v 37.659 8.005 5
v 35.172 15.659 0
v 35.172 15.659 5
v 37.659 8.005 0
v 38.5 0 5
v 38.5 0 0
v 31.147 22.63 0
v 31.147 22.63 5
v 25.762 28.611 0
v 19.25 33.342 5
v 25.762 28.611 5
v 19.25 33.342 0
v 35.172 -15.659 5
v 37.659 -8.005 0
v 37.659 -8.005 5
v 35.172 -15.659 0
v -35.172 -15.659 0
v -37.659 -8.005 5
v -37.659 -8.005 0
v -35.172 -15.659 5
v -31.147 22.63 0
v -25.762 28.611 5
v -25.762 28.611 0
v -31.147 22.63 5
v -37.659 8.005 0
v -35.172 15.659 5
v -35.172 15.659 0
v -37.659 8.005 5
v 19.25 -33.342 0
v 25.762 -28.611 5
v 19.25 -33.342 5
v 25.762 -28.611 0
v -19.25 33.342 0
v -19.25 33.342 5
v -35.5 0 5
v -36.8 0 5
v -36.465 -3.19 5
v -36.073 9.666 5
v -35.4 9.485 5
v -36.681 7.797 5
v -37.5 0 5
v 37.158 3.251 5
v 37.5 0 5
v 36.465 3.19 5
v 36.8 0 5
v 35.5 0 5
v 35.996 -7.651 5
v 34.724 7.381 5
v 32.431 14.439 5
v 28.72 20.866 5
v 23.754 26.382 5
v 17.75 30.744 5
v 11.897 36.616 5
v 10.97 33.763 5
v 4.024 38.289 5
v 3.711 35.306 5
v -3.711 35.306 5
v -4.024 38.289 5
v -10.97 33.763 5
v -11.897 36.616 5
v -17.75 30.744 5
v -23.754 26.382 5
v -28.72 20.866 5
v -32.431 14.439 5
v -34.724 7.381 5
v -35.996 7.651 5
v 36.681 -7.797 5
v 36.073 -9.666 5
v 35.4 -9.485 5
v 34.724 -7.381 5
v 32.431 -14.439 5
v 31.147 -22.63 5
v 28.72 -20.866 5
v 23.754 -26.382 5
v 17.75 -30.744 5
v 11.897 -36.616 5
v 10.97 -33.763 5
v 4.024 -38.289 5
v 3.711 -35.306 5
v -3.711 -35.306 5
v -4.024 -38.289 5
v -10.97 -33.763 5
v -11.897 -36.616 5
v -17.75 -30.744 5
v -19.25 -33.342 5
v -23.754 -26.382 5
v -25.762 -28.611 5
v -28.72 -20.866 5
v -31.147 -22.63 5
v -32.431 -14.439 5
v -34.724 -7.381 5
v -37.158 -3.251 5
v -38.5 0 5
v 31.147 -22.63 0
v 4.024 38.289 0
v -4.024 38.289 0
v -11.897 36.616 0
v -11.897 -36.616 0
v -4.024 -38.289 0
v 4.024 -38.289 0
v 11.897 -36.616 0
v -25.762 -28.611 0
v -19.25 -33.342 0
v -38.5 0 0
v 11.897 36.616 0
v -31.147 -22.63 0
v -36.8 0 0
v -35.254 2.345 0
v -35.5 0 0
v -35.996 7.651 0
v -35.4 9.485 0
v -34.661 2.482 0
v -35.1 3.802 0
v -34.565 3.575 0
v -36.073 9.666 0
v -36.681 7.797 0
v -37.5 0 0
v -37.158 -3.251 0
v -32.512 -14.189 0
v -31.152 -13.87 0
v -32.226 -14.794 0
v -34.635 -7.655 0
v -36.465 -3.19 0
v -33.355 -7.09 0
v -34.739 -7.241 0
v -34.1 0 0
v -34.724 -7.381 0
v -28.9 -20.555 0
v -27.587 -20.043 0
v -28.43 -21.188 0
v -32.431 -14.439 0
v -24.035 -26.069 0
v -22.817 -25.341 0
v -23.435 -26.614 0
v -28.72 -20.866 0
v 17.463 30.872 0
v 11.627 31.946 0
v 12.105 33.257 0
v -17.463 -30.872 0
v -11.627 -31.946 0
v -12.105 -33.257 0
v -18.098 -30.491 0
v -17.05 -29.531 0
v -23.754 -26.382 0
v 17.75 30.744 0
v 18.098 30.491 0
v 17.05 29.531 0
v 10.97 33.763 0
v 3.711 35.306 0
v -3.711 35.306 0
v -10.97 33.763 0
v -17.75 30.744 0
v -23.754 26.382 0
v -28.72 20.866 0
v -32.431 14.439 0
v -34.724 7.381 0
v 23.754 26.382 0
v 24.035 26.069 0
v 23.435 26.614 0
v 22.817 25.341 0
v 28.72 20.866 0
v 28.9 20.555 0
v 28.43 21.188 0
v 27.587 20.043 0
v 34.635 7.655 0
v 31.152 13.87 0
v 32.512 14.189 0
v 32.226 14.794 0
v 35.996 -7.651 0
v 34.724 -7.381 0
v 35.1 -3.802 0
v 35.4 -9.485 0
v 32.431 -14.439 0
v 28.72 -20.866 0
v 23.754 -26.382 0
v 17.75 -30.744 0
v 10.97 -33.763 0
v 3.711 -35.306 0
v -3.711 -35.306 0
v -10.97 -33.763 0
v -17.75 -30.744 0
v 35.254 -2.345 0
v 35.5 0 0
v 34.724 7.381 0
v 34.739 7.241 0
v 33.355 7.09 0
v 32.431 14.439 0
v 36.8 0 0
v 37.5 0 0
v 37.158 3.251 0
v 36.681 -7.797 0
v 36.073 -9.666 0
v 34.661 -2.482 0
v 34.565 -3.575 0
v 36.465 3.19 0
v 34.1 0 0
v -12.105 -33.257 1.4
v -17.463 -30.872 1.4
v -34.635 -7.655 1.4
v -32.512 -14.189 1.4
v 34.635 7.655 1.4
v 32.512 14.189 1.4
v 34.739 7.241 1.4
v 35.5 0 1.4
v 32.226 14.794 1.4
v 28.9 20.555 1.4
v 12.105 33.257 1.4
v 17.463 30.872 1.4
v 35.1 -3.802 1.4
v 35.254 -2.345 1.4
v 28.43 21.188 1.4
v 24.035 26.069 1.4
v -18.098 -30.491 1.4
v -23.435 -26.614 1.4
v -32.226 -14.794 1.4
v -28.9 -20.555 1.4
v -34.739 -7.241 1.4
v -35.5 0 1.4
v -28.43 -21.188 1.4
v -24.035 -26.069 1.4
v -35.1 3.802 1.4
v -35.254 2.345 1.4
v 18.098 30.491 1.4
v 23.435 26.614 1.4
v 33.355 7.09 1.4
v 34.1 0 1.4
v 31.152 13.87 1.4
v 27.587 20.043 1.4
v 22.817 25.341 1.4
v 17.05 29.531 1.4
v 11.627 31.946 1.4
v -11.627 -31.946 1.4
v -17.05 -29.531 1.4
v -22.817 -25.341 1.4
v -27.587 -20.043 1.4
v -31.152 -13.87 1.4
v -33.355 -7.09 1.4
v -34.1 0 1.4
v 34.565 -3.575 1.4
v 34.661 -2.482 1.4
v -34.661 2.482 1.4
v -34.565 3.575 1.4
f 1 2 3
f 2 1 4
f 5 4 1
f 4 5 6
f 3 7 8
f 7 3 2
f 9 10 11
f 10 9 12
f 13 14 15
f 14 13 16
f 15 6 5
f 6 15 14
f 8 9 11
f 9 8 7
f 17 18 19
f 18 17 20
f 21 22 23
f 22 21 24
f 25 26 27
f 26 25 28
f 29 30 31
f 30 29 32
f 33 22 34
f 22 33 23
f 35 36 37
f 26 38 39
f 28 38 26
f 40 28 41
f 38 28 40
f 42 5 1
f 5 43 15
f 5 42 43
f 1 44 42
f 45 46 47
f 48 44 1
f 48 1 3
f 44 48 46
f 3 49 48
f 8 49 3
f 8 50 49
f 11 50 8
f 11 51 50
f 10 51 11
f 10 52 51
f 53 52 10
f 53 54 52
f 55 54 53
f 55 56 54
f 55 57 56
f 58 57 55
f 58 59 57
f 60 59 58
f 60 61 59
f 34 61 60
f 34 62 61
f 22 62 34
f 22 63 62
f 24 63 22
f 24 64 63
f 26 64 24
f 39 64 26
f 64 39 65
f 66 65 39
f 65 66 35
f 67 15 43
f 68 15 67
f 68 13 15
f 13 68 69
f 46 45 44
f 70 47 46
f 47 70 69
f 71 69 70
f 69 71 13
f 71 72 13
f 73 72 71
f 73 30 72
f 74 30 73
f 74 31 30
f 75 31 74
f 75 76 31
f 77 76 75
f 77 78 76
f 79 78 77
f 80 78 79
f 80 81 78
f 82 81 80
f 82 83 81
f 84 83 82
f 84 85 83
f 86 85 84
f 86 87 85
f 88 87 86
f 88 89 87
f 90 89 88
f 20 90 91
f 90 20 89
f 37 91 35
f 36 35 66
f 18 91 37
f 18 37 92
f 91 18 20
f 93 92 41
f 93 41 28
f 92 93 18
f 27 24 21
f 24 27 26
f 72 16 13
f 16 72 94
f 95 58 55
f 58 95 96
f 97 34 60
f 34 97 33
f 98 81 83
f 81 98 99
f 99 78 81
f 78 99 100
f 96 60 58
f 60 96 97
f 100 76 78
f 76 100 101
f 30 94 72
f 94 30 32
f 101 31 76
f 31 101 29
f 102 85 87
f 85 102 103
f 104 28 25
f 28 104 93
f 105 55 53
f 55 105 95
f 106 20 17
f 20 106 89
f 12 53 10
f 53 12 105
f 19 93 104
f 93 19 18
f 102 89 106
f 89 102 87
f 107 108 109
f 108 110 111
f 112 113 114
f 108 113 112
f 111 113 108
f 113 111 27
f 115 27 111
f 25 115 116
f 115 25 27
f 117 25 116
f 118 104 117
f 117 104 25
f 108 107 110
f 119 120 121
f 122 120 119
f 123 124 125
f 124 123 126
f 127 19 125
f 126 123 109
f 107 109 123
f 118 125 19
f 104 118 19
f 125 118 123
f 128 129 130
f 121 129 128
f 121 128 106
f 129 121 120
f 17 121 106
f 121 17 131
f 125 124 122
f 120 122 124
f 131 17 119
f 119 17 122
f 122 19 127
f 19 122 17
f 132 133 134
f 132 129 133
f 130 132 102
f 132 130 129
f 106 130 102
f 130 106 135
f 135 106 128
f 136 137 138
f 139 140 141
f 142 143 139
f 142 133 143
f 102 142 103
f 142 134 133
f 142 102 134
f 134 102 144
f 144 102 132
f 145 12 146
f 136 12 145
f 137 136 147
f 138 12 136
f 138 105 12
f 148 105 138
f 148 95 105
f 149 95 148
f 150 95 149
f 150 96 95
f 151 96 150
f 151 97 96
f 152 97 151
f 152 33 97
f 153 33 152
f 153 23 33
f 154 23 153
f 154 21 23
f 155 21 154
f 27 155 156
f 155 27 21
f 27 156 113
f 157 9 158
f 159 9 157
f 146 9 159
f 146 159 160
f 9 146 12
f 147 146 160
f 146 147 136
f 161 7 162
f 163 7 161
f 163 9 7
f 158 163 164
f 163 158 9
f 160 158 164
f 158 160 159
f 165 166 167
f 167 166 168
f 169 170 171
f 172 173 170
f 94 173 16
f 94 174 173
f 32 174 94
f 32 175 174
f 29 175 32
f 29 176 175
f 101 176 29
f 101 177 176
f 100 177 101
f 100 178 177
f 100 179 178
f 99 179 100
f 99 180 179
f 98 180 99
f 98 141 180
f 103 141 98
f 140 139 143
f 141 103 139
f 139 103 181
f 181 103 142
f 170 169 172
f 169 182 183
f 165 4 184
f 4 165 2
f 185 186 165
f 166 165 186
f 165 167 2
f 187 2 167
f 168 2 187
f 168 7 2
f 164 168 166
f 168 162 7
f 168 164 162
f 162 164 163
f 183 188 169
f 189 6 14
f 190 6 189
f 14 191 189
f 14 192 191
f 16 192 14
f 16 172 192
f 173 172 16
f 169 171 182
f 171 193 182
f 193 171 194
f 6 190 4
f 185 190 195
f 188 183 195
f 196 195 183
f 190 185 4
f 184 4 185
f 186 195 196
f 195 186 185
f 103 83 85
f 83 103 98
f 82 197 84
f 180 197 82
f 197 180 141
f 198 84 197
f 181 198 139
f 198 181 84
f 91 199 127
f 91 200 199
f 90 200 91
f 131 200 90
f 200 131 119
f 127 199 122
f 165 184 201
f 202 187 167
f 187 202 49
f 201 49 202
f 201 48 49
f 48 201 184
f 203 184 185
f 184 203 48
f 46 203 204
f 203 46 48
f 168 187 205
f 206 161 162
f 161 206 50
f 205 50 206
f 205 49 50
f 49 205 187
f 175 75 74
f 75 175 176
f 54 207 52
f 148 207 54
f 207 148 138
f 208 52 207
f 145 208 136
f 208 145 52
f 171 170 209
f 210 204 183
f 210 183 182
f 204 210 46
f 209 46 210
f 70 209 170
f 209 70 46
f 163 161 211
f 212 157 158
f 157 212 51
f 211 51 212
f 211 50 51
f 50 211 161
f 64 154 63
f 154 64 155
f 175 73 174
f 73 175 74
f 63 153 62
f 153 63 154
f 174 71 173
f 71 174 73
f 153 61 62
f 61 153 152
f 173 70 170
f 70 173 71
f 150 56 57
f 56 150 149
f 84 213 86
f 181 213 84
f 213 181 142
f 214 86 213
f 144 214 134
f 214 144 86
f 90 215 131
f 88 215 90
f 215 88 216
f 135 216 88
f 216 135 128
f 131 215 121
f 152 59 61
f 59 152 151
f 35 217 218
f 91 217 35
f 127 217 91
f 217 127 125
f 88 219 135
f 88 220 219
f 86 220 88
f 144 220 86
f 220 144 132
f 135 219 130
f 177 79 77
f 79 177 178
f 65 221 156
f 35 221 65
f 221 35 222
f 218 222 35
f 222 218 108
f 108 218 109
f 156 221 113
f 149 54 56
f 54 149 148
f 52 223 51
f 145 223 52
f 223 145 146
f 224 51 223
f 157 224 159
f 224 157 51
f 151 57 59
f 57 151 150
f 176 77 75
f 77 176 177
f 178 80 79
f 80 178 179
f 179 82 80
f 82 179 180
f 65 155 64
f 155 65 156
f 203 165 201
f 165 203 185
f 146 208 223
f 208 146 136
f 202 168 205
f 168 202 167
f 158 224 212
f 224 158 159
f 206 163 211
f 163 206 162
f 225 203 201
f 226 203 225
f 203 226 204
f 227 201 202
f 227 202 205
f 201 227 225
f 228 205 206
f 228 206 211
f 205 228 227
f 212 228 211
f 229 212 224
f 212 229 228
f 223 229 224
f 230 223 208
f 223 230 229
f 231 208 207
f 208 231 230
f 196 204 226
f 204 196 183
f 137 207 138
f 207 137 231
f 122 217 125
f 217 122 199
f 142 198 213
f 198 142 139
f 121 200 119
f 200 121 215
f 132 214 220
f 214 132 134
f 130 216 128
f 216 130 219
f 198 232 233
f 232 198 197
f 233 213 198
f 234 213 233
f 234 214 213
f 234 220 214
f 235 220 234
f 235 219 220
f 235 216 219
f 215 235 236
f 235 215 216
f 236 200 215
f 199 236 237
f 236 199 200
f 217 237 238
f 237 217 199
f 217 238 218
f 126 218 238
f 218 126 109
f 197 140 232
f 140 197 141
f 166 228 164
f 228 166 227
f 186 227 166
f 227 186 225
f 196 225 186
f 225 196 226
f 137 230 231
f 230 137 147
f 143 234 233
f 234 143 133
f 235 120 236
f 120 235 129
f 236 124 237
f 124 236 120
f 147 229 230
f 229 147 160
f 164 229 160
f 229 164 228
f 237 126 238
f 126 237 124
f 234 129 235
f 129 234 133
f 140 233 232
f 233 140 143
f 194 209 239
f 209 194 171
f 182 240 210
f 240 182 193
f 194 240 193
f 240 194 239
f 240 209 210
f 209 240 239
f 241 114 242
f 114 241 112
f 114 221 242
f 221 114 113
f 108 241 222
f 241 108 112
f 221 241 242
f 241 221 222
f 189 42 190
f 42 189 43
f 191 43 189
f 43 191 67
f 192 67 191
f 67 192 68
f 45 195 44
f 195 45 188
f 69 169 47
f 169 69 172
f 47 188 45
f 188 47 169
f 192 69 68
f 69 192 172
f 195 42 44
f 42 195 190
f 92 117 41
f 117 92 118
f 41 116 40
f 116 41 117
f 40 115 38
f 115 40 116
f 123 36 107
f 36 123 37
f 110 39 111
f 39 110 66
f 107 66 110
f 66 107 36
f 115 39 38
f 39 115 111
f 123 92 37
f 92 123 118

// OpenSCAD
outer_diameter = 71 / 2;
grip = 3 + outer_diameter;
grip_height = 5;
rail_dim = 1.4;
rail_degrees = 70;
nub_gap_degrees = 5;
inner_diameter = outer_diameter - (1 * rail_dim);

module outer(){
	difference(){
		cylinder(grip_height, grip, grip);
		translate([0,0,-0.5])cylinder(grip_height + 1, outer_diameter, outer_diameter);
	}
}

module inner() {
	color([1,0,0])
	difference(){
		union(){
			pie_slice(outer_diameter, 70);
			rotate([0,0,180])pie_slice(outer_diameter, 70);
		}
		translate([0,0,-0.5])cylinder(rail_dim + 1, inner_diameter, inner_diameter);	
	}
	rotate([0,0,-1 * nub_gap_degrees])nub();
	rotate([0,0,180 - nub_gap_degrees])nub();
}

module nub(){
	color([0,0,1])
	translate([outer_diameter ,0,0])
	cylinder(rail_dim, rail_dim / 1.5, rail_dim / 1.5);
}

module nub_gap(){
	dim = outer_diameter + 2;
	color([0,1,0])
	intersection(){
		difference(){
			translate([0,0,-5])cylinder(10, dim, dim);
			translate([0,0,-5.5])cylinder(11, dim - rail_dim/2, dim - rail_dim/2);
		}
		rotate([0,0,-15])translate([0,0,-5])pie_slice(grip, 20, 10);
	}
}

module pie_slice(r=3.0, a=30, h=rail_dim) {
  $fn=64;
  intersection() {
    cylinder(h,r,r);
    cube([r,r,h]);
    rotate(a-90) cube([r,r,h]);
  }
}


difference(){
	union(){
		outer();
		inner();
	}
	nub_gap();
	rotate([0,0,180])nub_gap();
}
